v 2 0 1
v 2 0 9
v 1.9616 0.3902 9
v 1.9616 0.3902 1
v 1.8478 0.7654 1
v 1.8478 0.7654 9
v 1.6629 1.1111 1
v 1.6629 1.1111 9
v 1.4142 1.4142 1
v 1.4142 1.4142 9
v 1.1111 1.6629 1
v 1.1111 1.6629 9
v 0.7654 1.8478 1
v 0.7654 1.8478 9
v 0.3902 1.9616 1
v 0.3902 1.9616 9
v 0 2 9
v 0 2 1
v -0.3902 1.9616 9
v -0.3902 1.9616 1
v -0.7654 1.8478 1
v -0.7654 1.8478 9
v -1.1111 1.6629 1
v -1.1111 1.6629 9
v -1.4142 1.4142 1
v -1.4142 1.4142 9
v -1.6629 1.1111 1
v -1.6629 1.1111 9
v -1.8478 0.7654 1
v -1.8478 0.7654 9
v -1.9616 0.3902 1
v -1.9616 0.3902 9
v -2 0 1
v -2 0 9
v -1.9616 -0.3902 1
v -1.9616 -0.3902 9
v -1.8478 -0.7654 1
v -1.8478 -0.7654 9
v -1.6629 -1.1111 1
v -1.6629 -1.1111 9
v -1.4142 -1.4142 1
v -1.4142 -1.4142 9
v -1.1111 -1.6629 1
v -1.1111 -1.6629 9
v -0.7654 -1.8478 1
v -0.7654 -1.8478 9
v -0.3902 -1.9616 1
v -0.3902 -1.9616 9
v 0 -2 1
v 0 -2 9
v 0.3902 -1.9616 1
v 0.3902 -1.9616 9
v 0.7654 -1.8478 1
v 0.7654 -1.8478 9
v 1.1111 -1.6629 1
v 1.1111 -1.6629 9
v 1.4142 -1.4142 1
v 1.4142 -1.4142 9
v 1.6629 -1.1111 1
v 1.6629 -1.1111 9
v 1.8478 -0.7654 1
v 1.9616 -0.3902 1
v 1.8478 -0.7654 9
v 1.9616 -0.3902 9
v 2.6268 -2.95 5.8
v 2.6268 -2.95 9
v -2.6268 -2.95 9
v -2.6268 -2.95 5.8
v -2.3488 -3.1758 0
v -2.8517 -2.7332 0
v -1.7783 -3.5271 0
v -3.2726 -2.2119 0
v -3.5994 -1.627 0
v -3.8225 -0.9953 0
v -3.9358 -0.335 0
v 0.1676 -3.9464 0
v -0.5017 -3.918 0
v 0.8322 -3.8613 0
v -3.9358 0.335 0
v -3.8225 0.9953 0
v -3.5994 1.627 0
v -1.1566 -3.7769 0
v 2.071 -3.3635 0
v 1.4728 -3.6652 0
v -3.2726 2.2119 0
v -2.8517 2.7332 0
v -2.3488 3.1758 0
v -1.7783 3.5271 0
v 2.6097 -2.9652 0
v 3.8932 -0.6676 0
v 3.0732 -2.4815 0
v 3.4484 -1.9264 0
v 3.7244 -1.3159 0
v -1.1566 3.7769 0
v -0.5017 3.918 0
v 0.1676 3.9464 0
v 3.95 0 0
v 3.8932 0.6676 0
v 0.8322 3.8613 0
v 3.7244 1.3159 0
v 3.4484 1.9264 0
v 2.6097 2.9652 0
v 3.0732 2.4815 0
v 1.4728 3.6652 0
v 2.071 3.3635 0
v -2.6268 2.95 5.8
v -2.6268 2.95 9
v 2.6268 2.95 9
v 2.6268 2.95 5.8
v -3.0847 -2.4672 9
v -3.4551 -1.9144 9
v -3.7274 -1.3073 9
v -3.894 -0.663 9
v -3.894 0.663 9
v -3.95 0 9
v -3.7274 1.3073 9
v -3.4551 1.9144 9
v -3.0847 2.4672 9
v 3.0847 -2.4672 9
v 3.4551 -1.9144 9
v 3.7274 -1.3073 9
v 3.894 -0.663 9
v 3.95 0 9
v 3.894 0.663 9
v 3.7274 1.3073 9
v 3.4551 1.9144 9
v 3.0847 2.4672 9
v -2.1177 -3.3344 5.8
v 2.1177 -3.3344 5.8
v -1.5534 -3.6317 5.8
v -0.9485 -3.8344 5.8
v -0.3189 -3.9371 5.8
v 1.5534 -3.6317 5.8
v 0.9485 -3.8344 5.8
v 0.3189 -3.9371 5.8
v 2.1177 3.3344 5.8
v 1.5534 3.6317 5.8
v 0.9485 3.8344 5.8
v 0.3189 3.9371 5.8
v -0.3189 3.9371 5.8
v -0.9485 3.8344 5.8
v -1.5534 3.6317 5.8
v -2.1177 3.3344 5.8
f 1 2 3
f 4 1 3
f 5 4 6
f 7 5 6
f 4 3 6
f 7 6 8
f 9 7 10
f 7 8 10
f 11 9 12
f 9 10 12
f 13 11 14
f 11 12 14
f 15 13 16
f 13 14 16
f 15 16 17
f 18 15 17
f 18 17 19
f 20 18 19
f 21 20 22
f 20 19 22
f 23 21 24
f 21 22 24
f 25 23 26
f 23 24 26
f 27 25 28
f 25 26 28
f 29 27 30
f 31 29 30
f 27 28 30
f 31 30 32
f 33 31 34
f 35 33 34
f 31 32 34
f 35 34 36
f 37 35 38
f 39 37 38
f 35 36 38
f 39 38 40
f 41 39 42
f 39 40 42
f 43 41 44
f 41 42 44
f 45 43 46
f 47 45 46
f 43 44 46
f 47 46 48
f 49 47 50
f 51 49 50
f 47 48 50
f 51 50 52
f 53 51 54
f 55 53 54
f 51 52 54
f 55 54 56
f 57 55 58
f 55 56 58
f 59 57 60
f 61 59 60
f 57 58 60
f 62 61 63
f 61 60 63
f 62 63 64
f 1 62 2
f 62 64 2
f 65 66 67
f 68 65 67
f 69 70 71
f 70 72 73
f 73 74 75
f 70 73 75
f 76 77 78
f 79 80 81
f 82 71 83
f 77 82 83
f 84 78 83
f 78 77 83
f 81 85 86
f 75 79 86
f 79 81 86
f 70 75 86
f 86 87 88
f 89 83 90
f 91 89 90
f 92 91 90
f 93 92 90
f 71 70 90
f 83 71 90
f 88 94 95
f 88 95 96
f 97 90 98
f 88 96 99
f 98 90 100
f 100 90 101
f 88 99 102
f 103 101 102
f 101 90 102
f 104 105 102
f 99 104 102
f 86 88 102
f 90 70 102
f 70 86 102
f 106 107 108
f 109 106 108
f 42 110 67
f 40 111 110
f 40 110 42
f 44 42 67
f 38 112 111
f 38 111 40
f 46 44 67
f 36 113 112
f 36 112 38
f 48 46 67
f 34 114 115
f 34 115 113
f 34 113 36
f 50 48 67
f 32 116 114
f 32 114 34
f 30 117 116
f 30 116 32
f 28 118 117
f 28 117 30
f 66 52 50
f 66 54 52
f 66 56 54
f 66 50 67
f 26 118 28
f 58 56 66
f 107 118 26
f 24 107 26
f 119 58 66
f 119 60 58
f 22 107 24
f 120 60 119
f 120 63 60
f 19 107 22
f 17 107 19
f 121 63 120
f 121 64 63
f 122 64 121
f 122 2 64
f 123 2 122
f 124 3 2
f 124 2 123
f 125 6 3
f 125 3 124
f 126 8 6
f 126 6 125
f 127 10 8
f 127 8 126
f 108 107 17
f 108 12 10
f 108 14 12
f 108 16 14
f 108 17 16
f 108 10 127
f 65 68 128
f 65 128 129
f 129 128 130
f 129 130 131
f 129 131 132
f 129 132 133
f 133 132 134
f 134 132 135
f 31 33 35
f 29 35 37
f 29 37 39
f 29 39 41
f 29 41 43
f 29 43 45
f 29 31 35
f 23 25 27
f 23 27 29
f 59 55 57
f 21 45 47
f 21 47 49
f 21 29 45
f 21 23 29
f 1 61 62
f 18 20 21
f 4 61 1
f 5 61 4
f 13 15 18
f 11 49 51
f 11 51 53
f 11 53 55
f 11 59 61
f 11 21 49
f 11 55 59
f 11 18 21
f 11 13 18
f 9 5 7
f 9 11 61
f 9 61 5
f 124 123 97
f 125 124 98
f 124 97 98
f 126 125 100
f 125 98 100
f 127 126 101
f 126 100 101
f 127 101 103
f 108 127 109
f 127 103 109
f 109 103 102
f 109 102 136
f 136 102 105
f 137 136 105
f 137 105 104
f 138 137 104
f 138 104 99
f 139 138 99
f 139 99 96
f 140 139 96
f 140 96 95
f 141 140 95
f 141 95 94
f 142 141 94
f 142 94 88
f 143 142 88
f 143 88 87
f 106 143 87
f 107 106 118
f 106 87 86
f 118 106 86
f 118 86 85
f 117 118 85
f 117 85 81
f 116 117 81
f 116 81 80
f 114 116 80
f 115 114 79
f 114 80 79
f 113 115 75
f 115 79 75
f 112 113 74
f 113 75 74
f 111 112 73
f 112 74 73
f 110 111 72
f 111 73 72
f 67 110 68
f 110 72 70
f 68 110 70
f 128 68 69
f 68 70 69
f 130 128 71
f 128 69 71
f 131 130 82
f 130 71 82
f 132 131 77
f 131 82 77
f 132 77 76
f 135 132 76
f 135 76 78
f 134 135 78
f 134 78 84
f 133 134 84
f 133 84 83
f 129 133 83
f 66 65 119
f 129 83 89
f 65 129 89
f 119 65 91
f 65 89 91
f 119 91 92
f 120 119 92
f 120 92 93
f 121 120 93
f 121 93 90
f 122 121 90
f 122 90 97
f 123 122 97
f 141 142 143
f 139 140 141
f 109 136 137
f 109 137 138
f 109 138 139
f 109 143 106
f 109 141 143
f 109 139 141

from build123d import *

# Parameters (mm, degrees)
F0_R     = 3.95
F1_DEPTH = 9
F3_DEPTH = 3.2
F4_R     = 2
F5_DEPTH = 8


with BuildPart() as f1:
    # F0 (on Top) → F1 (new body)
    with BuildSketch(Plane.XY):
        Circle(F0_R)
    extrude(amount=F1_DEPTH)

    # F2 (on face) → F3 (cut)
    with BuildSketch(Plane.XY.offset(9)):
        with BuildLine():
            Line((2.626785, -2.95), (-2.626785, -2.95))
            ThreePointArc((-2.626785, -2.95), (0, -3.95), (2.626785, -2.95))
        make_face()
        with BuildLine():
            ThreePointArc((2.626785, 2.95), (0, 3.95), (-2.626785, 2.95))
            Line((-2.626785, 2.95), (2.626785, 2.95))
        make_face()
    extrude(amount=-F3_DEPTH, mode=Mode.SUBTRACT)

    # F4 (on face) → F5 (cut)
    with BuildSketch(Plane.XY.offset(9)):
        Circle(F4_R)
    extrude(amount=-F5_DEPTH, mode=Mode.SUBTRACT)


solid = f1.part
